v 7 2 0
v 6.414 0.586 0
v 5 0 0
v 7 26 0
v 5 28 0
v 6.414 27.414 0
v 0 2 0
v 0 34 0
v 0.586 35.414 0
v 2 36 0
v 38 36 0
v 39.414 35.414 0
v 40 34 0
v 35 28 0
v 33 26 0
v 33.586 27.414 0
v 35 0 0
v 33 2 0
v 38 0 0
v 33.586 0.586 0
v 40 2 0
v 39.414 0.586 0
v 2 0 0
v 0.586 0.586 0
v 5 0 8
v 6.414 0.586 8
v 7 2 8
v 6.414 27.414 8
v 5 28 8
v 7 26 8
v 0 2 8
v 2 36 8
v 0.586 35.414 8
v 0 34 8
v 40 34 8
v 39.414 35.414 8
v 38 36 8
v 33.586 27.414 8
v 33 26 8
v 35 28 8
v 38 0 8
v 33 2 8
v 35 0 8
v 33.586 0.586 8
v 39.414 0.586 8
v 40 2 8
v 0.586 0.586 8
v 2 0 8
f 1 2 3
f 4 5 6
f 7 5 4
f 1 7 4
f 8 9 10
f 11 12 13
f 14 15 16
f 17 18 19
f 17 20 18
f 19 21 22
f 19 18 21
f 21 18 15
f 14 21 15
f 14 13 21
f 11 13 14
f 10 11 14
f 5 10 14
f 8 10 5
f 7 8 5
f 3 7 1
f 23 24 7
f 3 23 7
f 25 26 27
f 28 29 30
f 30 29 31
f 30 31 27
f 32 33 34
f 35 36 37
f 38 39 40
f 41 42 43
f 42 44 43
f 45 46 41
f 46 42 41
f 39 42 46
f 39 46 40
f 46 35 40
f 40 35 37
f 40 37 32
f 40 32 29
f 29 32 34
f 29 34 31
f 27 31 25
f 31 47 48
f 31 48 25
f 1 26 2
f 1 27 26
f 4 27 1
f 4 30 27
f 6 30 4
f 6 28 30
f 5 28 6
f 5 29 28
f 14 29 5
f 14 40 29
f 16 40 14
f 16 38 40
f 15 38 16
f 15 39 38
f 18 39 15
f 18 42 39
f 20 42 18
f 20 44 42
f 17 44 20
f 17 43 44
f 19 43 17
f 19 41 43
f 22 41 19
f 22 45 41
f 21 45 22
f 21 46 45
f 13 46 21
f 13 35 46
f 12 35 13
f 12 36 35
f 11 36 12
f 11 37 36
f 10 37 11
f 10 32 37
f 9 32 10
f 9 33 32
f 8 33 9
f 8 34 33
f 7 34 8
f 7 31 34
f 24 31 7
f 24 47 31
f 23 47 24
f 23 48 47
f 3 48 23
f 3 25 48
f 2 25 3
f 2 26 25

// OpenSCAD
$fn = 32;

// ----------------------------------------------------------------------
// Clip blank: staple clip, 8 mm thick
// ----------------------------------------------------------------------

// --- parameters (mm) ---
profile_height = 8;       // extrusion height
profile_points = 24;      // points of the closed outline

profile = [[0, 2], [0.586, 0.586], [2, 0], [5, 0], [6.414, 0.586], [7, 2], [7, 26], [6.414, 27.414], [5, 28], [35, 28], [33.586, 27.414], [33, 26], [33, 2], [33.586, 0.586], [35, 0], [38, 0], [39.414, 0.586], [40, 2], [40, 34], [39.414, 35.414], [38, 36], [2, 36], [0.586, 35.414], [0, 34]];  // single closed polygon, 24 points, counter clockwise

// --- the one profile operation ---
linear_extrude(height = profile_height) polygon(points = profile);
